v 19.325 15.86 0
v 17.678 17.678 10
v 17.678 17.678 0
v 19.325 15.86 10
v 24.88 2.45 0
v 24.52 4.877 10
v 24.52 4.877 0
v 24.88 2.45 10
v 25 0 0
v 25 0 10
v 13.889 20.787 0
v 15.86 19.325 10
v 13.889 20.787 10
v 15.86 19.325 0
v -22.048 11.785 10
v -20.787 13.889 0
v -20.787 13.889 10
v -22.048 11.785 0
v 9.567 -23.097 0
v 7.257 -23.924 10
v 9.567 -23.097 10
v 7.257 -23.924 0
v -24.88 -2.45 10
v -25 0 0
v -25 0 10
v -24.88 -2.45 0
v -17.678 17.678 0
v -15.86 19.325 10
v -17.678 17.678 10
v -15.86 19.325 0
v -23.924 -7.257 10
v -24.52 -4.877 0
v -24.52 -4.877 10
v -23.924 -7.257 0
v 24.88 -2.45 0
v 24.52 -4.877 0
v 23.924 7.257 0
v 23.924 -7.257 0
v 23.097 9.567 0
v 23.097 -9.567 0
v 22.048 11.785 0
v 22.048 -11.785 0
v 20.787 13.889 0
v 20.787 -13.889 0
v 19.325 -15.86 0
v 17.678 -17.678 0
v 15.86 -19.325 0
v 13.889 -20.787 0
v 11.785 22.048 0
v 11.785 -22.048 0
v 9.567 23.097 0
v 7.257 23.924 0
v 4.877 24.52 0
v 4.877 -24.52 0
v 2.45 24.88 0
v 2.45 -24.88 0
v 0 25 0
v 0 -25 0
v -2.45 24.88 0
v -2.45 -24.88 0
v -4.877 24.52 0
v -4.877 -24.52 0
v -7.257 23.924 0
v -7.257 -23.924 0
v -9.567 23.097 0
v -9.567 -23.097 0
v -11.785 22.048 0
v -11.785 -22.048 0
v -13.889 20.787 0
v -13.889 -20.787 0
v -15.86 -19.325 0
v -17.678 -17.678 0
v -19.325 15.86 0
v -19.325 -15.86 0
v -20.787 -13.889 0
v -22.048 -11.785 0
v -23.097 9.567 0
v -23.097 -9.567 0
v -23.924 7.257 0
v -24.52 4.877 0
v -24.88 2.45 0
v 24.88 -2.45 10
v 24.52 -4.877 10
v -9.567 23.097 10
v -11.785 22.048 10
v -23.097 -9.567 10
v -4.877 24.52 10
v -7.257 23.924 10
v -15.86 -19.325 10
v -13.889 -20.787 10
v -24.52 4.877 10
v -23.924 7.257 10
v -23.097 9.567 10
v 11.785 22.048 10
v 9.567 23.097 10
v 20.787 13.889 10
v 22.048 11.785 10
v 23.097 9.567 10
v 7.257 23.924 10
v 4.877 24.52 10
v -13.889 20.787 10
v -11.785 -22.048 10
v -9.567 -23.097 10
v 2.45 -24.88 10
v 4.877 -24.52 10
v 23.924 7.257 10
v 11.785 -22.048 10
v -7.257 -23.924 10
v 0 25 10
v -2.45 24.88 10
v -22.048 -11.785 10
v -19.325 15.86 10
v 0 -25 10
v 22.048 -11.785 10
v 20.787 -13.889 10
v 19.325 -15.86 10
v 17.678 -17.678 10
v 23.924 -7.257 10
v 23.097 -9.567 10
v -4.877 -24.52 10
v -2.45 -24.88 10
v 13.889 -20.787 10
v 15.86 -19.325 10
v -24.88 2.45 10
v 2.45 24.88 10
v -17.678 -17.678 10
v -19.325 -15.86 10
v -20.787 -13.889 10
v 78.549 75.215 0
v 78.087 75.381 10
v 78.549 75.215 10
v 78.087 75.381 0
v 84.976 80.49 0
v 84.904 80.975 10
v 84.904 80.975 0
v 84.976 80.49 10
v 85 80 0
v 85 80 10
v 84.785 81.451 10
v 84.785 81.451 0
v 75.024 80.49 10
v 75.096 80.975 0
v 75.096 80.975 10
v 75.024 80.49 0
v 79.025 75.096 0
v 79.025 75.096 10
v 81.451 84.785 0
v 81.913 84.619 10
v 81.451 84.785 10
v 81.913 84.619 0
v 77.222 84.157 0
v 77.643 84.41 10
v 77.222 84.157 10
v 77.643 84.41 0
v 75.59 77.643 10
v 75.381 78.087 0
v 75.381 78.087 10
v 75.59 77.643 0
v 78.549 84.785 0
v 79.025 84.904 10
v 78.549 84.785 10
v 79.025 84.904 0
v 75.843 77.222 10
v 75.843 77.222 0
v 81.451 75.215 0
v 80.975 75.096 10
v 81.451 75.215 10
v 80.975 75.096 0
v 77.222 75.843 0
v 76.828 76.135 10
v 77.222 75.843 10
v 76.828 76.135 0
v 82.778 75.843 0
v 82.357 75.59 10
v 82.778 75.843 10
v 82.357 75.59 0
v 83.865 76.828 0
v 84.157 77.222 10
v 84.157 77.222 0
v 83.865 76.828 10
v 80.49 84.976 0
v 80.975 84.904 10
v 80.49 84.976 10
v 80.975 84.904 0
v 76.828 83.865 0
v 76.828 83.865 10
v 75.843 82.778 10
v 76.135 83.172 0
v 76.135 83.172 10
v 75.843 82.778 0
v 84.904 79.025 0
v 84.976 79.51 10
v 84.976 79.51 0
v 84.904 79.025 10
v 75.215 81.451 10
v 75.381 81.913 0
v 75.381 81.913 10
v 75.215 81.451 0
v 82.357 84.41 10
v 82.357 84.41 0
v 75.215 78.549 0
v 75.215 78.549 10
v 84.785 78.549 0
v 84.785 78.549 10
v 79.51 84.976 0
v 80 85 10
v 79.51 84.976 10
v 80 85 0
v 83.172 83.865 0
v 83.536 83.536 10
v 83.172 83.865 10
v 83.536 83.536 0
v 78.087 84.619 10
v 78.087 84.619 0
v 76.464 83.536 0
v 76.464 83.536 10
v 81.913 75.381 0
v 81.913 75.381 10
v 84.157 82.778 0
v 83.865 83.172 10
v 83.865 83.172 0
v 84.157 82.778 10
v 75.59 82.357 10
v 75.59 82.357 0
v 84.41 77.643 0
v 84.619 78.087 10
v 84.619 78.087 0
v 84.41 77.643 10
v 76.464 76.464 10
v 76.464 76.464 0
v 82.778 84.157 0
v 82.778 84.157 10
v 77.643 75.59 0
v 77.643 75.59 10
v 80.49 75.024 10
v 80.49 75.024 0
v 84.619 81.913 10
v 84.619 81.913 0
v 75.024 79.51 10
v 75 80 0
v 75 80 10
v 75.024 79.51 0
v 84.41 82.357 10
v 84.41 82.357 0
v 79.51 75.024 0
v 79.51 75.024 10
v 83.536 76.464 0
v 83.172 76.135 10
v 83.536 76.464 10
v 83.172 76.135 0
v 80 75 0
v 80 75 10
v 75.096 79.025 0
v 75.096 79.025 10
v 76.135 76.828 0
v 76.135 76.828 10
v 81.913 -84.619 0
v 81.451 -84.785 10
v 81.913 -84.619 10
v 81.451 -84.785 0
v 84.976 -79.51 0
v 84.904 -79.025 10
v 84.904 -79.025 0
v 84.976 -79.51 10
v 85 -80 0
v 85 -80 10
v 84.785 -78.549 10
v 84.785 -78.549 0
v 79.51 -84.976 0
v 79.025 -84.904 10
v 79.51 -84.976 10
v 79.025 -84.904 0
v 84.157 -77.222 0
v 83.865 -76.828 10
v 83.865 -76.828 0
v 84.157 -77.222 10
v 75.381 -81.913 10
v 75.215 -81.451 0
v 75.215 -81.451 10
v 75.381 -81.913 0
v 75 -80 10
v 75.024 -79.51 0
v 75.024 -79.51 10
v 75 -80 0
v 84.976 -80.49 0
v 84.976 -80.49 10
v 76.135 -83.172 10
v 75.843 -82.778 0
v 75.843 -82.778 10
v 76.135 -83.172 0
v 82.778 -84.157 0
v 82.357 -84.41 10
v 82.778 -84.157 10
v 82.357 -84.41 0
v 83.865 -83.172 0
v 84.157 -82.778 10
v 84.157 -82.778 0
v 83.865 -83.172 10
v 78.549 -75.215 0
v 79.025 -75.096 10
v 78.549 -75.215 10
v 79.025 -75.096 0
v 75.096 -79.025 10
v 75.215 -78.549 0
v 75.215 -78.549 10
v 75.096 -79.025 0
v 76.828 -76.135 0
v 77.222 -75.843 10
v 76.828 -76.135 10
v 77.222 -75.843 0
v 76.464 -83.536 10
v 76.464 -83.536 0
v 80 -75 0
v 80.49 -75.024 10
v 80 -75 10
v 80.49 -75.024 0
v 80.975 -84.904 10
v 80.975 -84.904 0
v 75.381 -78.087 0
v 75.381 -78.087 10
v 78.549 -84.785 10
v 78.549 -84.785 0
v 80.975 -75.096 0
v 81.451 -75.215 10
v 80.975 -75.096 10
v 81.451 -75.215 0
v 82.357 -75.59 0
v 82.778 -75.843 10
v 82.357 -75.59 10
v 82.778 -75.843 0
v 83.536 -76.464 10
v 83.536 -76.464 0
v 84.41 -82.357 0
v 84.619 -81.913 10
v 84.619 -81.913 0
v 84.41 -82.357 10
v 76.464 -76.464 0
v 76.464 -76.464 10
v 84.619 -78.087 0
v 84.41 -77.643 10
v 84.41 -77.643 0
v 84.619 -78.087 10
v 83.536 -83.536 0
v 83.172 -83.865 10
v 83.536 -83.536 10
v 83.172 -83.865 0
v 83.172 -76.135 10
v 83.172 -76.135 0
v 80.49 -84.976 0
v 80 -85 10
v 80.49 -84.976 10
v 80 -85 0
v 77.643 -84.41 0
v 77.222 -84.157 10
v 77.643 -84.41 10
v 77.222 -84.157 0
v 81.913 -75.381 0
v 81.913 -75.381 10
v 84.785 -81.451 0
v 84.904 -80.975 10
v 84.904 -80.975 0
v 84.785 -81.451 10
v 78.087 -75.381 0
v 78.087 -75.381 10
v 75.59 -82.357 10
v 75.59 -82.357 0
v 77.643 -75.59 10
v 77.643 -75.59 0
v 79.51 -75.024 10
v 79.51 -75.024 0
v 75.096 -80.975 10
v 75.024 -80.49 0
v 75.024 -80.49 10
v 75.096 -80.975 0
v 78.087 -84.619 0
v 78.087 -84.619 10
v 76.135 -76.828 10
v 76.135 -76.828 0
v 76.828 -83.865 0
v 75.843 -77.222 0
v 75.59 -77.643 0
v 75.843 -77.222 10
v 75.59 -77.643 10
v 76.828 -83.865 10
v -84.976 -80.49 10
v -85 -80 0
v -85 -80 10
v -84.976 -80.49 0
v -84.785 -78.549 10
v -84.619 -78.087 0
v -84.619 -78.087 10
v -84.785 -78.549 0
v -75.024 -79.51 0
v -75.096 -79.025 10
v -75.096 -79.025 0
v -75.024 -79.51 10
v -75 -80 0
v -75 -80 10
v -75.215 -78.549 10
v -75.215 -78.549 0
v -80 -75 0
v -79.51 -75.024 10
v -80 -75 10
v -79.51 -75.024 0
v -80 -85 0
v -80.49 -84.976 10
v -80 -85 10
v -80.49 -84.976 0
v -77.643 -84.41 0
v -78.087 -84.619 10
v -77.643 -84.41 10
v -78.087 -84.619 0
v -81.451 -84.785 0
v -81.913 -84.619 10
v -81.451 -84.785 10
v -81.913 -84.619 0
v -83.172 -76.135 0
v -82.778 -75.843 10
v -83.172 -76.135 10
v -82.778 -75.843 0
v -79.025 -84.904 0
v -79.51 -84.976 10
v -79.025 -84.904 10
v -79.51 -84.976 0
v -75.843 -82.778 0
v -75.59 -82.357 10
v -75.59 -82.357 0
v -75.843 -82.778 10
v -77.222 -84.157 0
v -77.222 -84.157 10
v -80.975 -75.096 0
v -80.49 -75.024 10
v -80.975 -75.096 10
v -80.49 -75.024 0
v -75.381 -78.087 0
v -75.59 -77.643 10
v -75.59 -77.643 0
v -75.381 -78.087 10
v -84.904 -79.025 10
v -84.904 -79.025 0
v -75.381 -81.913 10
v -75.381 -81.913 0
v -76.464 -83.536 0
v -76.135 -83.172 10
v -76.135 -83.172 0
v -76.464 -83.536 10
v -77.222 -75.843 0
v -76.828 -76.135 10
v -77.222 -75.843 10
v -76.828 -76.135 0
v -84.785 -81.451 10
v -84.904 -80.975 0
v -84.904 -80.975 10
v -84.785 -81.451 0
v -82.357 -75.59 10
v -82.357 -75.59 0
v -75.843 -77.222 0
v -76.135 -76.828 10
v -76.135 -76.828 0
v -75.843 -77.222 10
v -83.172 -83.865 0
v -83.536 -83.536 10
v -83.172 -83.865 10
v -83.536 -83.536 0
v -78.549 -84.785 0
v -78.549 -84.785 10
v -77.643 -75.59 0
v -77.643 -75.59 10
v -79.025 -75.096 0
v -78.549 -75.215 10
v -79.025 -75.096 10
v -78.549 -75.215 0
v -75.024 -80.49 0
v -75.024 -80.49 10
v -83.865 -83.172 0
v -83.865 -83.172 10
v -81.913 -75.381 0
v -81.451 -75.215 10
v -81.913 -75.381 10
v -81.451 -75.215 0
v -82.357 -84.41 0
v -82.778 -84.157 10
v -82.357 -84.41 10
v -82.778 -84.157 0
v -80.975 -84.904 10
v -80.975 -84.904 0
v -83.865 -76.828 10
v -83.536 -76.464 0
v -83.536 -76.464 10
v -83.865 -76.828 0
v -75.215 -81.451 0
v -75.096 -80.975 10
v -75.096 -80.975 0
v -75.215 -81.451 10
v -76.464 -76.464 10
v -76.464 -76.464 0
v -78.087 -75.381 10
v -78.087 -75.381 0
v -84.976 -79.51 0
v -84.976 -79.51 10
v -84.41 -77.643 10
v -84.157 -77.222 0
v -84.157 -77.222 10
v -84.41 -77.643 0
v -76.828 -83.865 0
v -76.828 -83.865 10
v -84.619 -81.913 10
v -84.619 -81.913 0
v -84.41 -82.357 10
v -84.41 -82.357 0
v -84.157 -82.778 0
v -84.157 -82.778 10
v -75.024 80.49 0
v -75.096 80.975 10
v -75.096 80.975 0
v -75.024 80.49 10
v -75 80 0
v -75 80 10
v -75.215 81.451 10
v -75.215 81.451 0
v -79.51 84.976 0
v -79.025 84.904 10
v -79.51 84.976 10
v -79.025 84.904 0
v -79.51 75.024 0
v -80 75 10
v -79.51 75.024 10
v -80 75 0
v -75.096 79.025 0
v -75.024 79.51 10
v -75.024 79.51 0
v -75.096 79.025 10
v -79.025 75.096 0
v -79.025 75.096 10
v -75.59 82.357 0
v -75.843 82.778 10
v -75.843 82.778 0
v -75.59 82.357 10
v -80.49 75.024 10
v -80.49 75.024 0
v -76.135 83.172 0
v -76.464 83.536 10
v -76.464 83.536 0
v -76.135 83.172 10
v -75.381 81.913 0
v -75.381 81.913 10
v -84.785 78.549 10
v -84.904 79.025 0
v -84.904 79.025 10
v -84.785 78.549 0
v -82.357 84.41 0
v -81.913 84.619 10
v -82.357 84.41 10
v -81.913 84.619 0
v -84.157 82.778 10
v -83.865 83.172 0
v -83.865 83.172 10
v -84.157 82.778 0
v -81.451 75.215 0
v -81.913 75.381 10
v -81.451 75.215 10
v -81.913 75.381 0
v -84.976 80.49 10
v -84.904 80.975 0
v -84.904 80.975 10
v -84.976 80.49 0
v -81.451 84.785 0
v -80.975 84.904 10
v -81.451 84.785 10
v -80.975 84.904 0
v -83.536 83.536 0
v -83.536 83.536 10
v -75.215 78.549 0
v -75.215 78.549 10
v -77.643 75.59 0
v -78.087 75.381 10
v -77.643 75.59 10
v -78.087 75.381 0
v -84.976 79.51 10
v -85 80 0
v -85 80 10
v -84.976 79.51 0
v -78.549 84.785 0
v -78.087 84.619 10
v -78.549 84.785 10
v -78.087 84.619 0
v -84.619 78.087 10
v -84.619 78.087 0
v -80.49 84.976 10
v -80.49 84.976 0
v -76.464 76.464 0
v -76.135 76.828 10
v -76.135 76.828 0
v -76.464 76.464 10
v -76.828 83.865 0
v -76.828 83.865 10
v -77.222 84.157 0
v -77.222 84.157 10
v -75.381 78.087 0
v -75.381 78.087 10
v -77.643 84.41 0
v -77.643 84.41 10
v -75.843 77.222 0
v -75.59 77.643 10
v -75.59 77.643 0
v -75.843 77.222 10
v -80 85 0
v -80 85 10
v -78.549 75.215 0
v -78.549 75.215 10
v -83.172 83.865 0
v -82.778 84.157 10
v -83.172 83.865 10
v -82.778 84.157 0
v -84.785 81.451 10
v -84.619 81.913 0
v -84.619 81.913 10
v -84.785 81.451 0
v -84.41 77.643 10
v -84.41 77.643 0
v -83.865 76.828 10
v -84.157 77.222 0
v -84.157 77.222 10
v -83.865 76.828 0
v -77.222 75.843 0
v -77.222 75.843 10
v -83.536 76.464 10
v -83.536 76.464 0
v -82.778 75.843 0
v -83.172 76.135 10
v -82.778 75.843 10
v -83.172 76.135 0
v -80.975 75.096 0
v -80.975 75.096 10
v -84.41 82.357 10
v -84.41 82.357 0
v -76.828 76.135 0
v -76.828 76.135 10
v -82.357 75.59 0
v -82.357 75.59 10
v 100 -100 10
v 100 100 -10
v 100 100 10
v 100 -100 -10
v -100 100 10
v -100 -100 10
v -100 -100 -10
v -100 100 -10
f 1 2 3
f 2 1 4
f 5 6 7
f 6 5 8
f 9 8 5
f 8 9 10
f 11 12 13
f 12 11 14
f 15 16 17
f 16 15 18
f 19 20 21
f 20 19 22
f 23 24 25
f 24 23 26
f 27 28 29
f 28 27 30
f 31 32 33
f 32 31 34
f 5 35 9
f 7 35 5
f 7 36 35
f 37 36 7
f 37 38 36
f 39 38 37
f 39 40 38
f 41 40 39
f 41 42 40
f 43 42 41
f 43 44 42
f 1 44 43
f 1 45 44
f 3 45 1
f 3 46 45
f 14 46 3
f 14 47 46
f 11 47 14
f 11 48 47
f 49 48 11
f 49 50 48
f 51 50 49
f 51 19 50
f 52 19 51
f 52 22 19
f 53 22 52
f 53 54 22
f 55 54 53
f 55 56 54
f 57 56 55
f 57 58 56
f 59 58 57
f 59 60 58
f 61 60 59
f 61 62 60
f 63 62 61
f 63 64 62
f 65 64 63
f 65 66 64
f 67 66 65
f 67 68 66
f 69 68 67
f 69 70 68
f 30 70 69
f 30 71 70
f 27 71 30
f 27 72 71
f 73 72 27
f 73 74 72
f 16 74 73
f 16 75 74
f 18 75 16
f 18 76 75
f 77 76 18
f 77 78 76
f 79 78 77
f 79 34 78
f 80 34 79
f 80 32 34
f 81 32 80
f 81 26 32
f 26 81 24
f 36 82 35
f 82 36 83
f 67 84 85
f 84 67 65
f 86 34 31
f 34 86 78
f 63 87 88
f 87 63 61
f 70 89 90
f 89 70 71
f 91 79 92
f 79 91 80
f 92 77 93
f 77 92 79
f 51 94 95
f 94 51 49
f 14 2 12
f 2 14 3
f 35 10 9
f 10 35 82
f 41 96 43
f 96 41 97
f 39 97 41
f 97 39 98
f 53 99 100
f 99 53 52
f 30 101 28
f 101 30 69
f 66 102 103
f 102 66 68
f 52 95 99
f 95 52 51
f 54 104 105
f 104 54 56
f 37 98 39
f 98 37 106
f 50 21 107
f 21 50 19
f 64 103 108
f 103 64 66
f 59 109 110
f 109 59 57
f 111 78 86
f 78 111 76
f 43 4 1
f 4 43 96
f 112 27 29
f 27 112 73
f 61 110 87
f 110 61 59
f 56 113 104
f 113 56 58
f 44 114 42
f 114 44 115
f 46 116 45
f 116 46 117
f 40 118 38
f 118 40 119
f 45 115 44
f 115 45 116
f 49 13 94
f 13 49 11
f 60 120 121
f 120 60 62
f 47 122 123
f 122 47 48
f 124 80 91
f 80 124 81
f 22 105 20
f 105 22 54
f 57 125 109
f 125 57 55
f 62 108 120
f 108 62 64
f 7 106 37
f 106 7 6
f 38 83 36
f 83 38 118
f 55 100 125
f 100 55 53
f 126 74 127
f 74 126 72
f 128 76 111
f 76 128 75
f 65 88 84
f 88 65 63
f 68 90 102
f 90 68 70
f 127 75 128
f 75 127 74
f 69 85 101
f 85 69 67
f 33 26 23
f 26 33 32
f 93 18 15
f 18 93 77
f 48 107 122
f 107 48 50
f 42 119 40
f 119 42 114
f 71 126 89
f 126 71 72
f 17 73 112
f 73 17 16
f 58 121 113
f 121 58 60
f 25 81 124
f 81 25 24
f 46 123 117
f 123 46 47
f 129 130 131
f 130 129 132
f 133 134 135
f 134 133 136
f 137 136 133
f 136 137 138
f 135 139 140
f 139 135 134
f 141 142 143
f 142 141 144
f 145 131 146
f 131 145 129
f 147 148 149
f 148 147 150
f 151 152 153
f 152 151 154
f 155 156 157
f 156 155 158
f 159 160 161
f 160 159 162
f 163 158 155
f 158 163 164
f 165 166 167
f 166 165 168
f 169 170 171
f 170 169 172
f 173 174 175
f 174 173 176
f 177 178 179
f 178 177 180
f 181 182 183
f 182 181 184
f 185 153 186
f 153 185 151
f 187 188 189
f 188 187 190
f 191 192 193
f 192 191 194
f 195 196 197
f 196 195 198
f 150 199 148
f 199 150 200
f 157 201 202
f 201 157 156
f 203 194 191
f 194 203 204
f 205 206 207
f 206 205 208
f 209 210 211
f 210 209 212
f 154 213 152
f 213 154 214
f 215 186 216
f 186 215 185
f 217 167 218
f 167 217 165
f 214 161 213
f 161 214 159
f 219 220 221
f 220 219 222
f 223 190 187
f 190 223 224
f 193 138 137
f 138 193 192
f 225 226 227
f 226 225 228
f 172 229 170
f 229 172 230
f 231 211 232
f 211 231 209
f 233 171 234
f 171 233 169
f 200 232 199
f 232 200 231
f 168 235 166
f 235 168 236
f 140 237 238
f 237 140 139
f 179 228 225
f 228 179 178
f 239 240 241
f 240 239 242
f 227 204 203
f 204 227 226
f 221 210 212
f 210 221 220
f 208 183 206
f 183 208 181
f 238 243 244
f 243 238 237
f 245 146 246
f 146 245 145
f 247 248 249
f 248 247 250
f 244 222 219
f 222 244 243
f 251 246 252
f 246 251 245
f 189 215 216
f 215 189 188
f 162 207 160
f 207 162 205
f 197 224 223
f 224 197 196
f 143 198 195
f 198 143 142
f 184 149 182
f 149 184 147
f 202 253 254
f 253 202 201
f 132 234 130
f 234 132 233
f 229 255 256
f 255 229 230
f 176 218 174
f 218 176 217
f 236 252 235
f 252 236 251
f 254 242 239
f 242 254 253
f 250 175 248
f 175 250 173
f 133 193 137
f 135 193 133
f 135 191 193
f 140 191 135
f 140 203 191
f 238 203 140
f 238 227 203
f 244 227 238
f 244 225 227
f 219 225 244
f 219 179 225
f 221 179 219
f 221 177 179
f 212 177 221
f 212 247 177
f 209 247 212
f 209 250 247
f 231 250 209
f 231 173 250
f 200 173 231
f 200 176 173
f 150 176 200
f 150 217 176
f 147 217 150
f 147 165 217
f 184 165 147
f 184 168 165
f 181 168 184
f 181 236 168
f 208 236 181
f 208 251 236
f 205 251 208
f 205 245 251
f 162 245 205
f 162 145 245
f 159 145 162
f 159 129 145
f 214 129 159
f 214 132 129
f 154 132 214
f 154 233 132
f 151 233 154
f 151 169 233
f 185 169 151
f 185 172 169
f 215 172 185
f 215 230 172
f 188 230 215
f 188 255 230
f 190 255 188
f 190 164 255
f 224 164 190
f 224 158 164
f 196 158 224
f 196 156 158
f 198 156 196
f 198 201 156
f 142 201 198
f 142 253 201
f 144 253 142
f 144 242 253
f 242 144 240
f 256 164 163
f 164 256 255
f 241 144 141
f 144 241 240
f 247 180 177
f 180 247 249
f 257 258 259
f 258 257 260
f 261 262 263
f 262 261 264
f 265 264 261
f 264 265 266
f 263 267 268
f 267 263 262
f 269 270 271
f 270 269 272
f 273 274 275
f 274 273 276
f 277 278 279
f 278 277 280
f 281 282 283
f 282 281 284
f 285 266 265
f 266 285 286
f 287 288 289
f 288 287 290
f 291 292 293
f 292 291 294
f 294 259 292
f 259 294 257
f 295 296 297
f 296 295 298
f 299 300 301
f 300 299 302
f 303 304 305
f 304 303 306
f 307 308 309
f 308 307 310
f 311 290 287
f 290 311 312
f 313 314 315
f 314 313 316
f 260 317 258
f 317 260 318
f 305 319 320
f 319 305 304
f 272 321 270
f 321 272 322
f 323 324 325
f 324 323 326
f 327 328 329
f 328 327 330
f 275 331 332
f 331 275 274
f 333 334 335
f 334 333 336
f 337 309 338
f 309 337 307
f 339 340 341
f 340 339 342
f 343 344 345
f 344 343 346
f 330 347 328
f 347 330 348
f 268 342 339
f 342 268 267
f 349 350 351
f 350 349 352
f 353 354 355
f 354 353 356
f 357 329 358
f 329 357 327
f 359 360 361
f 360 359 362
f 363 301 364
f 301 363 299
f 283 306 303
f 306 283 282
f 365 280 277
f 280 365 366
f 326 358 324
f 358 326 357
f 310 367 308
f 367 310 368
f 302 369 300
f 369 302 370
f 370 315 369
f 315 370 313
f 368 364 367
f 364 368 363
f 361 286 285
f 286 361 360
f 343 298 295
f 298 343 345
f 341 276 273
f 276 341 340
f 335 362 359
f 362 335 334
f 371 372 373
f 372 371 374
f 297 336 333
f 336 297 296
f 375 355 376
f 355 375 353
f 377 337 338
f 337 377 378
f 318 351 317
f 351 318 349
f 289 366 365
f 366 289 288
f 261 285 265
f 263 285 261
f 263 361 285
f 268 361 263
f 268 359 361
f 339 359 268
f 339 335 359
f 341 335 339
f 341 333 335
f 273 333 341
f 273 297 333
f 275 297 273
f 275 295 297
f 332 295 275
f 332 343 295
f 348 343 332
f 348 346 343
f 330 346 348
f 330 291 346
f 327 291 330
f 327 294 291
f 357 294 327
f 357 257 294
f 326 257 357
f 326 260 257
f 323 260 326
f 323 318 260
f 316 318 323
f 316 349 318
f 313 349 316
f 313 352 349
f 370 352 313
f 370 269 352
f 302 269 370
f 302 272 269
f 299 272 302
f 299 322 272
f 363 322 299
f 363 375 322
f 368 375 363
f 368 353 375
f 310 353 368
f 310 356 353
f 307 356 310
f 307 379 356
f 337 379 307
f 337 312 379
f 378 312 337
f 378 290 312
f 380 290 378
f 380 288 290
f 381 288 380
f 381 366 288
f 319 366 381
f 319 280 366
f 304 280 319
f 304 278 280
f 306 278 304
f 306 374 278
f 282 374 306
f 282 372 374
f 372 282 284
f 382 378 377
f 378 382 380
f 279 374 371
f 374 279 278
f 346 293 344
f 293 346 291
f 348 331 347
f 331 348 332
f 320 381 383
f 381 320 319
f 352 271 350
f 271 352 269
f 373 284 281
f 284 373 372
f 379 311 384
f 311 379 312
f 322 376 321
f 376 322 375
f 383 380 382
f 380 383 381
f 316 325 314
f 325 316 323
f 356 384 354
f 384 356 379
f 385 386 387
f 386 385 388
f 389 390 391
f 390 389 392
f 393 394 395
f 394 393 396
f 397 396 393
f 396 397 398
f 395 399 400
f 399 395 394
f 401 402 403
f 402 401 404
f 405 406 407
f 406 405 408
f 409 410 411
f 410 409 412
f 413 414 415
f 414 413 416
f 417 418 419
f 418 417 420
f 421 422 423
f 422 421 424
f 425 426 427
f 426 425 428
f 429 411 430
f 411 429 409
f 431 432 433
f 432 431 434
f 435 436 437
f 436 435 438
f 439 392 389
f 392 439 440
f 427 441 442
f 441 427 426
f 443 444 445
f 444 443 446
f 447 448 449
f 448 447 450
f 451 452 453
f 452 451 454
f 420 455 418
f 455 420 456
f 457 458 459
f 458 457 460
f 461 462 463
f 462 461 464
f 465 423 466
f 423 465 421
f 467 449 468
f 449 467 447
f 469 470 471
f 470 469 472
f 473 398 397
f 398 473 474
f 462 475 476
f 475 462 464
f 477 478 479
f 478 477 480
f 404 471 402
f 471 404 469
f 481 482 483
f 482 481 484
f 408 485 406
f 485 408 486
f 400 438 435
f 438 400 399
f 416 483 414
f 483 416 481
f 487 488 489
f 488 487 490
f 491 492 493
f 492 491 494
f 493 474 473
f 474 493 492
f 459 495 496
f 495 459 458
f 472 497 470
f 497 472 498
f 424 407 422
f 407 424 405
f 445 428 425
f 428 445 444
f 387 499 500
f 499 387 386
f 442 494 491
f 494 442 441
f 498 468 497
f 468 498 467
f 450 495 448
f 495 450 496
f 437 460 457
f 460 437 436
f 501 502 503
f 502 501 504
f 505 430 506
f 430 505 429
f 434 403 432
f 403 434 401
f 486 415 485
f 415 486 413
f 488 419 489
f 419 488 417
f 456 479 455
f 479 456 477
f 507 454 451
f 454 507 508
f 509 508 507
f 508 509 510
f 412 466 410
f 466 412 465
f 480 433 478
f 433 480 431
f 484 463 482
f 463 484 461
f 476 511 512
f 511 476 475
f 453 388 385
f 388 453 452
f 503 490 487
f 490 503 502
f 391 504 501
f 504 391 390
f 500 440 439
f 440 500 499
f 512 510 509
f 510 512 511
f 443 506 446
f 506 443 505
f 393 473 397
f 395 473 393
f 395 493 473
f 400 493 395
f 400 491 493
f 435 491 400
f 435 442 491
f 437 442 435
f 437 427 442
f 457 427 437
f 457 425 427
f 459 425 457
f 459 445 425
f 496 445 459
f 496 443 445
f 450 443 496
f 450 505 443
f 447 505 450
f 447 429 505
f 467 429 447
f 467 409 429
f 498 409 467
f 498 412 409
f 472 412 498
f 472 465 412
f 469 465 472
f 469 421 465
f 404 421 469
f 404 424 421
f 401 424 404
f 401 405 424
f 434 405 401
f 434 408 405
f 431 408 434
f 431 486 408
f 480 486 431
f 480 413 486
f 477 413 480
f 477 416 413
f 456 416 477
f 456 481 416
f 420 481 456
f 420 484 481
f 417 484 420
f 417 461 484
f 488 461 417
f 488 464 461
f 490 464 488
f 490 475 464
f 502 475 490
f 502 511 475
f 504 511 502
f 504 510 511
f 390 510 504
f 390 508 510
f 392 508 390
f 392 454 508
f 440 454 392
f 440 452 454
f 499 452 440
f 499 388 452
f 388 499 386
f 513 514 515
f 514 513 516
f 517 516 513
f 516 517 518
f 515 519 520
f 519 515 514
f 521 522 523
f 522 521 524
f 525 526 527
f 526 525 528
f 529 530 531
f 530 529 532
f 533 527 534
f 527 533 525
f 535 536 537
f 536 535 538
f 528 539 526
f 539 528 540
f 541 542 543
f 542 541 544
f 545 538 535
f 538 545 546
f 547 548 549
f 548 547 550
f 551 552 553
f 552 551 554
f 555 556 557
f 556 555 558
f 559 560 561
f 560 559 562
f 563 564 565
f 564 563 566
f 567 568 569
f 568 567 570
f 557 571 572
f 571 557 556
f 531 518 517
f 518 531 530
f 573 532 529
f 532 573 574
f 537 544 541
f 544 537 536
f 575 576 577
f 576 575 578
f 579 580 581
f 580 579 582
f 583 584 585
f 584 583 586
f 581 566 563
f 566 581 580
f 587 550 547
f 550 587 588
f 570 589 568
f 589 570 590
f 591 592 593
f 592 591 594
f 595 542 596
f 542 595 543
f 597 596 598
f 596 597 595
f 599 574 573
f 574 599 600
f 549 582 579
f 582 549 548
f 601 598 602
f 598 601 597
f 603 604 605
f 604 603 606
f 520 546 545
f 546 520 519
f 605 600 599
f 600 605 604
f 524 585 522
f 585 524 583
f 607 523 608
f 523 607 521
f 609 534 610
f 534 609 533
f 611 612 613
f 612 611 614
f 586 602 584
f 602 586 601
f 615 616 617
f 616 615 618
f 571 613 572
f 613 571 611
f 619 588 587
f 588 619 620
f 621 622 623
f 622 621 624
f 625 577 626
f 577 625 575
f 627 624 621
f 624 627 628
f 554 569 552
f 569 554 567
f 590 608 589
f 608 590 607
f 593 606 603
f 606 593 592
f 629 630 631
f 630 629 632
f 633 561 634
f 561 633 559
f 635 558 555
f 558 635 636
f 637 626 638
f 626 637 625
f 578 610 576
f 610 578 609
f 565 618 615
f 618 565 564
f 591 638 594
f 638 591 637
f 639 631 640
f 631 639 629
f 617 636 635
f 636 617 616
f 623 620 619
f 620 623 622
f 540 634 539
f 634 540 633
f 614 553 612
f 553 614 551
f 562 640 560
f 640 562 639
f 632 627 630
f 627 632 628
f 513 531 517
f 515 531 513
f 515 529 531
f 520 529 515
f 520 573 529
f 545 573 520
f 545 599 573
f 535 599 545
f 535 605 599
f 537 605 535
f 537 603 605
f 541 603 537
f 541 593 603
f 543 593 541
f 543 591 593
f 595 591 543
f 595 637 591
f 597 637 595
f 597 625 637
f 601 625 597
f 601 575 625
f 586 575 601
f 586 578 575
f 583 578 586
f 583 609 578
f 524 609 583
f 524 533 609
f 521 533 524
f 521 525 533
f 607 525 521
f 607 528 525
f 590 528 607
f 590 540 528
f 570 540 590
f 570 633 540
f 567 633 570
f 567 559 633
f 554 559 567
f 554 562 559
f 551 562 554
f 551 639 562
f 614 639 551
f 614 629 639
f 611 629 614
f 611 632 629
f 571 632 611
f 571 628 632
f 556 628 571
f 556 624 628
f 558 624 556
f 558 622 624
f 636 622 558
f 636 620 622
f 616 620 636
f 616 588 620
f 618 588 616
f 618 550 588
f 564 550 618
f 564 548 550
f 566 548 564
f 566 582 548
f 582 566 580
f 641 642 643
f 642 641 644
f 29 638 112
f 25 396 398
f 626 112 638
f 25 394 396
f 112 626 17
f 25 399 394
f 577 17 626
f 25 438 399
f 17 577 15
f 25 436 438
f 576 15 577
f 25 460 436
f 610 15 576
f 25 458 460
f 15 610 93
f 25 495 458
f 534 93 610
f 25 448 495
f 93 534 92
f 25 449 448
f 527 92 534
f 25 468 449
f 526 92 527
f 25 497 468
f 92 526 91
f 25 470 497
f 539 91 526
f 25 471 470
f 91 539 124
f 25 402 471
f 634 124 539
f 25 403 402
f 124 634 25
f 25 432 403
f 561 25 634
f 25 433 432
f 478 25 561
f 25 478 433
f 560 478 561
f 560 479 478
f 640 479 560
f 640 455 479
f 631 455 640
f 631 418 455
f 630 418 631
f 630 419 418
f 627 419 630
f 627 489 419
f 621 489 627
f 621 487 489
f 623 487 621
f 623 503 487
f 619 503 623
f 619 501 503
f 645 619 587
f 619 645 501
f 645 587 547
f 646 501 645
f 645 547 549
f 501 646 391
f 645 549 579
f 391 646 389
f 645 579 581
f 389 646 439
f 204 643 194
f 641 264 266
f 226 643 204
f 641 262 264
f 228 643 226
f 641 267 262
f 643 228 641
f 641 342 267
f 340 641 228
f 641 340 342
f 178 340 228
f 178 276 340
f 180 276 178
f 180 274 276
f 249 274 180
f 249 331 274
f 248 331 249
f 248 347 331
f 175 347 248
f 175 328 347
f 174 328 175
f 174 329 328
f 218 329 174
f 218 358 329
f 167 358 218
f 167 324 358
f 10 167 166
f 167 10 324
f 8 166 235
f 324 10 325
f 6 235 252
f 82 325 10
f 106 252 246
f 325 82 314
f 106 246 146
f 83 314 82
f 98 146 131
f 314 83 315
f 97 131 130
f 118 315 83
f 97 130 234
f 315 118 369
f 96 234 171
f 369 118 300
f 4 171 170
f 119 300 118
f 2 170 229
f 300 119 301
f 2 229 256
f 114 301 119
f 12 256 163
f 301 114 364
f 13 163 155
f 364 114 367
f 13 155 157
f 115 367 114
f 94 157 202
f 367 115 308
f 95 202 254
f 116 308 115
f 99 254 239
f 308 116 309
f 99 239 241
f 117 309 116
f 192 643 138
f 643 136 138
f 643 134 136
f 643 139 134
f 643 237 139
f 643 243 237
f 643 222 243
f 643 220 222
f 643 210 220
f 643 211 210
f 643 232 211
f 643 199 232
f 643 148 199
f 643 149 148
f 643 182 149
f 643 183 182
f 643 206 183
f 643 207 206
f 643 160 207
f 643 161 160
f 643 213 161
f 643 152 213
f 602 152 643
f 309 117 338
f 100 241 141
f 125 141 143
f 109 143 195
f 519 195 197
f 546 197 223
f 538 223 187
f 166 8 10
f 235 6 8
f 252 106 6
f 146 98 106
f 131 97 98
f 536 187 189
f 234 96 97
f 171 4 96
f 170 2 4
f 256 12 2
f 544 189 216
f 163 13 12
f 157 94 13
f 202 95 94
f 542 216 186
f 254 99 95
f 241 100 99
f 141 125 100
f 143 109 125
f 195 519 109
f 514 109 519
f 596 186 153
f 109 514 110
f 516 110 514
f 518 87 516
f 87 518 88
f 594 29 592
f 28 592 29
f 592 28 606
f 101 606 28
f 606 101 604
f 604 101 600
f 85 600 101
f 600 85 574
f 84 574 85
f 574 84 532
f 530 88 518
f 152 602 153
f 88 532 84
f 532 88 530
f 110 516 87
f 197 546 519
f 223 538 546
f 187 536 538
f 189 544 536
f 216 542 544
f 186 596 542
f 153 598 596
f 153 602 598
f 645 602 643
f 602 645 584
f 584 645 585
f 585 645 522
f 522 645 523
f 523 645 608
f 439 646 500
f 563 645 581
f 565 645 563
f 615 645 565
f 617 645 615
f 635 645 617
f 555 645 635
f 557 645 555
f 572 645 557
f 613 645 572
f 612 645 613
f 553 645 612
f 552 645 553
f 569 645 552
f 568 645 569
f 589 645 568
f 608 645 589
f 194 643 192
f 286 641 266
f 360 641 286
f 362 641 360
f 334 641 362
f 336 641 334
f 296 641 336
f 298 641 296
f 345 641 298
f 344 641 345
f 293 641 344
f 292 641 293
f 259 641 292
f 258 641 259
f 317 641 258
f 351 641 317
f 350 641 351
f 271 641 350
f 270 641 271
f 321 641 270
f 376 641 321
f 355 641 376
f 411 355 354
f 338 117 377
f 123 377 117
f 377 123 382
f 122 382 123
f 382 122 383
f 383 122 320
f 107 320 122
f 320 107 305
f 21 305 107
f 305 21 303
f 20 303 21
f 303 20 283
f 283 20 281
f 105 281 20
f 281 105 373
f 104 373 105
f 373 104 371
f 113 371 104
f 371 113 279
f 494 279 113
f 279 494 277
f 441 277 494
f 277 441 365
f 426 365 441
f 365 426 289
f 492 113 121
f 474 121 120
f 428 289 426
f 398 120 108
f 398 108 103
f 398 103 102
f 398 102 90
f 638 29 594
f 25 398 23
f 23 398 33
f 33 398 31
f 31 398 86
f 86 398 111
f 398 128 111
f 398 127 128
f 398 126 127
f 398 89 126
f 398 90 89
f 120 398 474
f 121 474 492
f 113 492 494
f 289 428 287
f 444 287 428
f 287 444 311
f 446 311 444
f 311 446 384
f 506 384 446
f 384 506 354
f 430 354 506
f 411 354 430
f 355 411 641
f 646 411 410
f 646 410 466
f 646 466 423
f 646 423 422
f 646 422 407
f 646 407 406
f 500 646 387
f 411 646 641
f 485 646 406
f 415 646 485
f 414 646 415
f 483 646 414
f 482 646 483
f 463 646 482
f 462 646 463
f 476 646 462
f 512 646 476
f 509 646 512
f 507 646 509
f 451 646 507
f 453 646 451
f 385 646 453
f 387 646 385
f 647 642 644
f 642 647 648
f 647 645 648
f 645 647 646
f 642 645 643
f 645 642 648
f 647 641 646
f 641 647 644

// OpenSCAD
difference(){cube(size=[200.0000,200.0000,20.0000],center=true);union(){cylinder(h=100.0000,d=50.0000,$fn=64);translate([80.0,80.0,0.0]){cylinder(h=100.0000,d=10.0000,$fn=64);}translate([80.0,-80.0,0.0]){cylinder(h=100.0000,d=10.0000,$fn=64);}translate([-80.0,-80.0,0.0]){cylinder(h=100.0000,d=10.0000,$fn=64);}translate([-80.0,80.0,0.0]){cylinder(h=100.0000,d=10.0000,$fn=64);}}}
